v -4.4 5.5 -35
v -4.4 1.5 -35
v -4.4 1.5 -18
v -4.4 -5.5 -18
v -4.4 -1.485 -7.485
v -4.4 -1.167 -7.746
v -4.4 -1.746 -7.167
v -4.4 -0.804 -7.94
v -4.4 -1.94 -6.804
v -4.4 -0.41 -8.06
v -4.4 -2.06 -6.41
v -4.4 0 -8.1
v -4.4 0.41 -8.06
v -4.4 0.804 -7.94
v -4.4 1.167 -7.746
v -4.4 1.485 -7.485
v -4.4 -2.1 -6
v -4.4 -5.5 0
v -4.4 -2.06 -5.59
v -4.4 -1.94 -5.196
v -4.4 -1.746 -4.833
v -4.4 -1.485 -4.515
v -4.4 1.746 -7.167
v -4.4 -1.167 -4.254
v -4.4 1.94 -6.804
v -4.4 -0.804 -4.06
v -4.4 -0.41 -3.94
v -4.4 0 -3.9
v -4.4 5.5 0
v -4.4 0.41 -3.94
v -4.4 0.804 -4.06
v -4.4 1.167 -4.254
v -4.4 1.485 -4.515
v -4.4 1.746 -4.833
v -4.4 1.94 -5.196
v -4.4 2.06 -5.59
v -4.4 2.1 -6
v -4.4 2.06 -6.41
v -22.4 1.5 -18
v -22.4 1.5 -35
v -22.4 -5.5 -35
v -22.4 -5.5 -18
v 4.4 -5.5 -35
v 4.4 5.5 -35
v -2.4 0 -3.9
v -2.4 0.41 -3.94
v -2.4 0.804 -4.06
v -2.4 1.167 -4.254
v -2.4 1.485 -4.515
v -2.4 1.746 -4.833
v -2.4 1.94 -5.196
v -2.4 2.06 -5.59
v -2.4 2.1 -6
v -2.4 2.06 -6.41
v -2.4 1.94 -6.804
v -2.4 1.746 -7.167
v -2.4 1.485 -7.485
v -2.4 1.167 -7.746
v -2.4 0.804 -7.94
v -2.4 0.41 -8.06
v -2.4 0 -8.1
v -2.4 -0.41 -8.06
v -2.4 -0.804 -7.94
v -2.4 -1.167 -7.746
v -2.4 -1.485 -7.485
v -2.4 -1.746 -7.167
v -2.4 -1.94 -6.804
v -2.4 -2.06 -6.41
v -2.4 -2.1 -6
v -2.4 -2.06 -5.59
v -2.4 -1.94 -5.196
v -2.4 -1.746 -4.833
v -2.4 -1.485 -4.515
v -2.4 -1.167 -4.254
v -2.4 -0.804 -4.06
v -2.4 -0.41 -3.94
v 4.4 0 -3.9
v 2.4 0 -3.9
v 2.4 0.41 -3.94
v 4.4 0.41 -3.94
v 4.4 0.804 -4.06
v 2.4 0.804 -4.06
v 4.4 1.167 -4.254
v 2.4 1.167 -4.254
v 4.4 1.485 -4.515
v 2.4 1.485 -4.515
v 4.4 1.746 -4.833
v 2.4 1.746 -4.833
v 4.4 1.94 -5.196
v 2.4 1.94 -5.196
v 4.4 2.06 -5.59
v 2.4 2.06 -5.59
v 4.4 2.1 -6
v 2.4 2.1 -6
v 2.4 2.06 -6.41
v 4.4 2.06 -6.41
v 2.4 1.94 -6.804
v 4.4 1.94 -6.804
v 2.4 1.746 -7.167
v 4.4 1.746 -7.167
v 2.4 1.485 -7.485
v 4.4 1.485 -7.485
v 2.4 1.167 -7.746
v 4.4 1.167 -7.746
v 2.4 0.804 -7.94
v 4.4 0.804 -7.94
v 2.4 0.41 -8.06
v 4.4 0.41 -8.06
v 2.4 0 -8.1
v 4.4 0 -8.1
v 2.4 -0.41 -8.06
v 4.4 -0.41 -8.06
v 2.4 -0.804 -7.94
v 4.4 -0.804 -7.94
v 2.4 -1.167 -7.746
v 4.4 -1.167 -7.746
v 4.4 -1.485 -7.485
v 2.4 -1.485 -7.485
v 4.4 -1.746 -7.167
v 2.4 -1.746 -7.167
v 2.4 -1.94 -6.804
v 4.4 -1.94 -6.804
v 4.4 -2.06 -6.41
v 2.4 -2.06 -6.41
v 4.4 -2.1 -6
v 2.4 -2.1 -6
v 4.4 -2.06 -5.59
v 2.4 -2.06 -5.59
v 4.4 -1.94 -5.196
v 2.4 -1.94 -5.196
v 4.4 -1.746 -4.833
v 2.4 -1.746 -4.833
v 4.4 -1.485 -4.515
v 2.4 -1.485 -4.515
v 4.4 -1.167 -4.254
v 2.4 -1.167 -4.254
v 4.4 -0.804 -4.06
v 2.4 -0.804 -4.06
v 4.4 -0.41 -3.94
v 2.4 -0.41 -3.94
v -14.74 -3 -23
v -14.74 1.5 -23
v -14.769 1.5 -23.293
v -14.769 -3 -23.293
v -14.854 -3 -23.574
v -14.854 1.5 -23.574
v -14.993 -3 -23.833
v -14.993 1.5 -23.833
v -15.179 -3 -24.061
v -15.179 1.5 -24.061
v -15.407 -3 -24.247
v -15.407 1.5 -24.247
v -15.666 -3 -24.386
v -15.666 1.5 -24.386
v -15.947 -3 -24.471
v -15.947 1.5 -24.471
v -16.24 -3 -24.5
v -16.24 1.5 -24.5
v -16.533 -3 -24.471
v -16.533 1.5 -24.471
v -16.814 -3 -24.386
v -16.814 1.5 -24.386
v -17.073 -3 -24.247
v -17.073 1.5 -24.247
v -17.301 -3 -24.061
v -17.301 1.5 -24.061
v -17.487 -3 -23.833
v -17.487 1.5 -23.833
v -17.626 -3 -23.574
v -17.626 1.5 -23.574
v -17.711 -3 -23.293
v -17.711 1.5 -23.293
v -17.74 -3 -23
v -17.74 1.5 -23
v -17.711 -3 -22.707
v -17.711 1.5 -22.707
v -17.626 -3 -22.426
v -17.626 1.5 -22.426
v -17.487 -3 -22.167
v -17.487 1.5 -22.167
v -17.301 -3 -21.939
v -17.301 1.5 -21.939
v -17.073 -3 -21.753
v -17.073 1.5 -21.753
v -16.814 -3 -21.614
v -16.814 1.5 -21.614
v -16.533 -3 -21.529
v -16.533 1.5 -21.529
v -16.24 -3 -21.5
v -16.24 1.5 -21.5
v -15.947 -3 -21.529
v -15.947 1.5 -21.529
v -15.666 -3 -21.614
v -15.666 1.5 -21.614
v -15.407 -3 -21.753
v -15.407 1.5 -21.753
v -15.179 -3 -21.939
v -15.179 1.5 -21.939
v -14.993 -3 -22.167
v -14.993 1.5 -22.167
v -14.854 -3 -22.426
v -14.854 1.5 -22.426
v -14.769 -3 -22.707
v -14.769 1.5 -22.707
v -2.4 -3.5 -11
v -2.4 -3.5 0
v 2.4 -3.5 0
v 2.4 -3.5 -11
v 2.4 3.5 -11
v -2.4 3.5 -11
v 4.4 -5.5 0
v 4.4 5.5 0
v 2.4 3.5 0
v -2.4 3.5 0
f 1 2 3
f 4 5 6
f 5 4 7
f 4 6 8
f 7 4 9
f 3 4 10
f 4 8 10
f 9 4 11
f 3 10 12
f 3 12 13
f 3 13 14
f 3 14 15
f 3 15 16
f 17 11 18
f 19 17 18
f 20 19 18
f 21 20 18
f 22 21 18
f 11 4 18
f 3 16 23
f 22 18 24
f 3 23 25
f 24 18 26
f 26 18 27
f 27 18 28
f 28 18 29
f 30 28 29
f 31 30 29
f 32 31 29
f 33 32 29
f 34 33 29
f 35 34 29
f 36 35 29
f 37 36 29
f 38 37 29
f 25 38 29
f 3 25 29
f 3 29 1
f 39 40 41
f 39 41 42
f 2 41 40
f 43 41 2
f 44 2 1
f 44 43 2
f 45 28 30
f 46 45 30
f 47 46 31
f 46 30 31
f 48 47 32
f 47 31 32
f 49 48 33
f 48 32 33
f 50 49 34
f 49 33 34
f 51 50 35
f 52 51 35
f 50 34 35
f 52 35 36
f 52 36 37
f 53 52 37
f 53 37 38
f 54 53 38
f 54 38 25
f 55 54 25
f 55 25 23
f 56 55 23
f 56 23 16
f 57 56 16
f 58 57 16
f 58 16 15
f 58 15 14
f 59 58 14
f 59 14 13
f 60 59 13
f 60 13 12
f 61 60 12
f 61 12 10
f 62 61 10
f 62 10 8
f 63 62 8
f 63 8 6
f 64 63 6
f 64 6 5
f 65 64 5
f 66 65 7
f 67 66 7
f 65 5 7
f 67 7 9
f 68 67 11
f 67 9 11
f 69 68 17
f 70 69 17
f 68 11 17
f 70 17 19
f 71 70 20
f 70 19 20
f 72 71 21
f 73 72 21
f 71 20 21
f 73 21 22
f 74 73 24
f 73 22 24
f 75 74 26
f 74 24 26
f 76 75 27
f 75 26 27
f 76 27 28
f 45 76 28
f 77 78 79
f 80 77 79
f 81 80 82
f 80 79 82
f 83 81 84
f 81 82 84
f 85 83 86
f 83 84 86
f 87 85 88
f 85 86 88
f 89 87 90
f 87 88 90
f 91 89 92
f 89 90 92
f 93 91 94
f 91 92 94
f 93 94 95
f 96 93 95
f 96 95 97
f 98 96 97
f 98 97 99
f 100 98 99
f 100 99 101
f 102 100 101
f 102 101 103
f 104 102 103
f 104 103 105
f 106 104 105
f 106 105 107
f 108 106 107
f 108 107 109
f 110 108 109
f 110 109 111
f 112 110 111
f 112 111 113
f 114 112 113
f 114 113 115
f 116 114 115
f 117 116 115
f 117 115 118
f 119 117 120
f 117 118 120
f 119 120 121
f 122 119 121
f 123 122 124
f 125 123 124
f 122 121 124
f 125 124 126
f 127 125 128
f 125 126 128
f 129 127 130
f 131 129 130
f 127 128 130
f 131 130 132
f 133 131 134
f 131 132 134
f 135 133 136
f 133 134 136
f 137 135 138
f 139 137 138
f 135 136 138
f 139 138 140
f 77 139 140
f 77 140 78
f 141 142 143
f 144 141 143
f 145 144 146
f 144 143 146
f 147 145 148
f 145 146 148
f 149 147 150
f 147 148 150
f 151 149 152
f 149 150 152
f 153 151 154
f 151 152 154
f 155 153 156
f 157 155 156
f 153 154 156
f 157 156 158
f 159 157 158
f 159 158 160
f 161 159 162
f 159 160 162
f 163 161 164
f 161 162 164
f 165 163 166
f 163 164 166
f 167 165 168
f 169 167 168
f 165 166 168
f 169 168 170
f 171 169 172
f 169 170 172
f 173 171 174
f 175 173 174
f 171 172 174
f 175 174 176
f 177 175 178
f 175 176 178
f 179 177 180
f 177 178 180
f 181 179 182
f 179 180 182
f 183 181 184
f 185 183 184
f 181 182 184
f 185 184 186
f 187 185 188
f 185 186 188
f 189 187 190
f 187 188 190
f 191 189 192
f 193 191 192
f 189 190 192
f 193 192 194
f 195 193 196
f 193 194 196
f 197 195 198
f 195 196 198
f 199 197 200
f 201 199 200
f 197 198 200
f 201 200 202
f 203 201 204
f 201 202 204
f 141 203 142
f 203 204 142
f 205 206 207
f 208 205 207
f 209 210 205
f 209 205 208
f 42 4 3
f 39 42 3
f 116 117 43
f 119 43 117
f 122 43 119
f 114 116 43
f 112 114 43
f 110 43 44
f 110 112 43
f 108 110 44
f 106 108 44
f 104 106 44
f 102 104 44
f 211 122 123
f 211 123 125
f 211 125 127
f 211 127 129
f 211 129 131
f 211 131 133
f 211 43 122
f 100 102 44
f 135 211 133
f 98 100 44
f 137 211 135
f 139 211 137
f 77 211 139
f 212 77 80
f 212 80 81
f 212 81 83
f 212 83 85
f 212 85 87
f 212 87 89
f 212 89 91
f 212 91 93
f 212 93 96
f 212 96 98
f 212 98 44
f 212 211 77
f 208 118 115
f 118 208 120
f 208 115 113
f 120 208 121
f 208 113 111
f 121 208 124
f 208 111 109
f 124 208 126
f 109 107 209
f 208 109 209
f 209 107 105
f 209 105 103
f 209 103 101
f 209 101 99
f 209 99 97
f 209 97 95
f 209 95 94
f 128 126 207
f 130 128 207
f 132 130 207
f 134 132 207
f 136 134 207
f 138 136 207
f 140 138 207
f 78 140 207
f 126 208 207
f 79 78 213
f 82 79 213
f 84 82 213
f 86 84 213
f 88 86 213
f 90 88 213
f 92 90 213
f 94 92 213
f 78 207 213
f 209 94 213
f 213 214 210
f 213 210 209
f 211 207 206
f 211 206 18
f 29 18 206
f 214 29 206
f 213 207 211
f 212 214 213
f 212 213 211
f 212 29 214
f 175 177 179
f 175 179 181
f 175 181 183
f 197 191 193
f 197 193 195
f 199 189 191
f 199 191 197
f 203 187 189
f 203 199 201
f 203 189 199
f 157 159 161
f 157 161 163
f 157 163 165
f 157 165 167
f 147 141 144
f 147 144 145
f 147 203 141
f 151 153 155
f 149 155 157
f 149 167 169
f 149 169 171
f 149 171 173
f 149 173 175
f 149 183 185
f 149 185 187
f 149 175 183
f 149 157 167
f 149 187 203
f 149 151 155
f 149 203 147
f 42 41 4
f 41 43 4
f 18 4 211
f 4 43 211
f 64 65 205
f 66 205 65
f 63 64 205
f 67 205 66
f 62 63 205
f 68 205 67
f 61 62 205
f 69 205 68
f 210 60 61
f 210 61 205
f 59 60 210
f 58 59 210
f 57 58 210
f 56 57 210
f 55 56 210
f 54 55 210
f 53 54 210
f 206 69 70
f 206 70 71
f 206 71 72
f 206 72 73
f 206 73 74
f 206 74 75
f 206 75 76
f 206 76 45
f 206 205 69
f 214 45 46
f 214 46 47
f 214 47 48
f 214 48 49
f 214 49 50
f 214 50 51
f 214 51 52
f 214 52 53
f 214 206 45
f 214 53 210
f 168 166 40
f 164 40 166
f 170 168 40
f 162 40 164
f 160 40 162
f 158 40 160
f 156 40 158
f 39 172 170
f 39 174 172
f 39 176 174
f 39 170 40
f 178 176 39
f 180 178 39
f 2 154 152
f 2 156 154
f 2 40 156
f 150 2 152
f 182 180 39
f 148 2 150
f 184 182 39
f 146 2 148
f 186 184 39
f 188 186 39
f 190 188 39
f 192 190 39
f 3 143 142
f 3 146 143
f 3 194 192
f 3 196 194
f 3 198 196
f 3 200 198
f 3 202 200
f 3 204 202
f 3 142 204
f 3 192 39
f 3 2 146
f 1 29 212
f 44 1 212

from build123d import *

# Parameters (mm, degrees)
SKETCH_1_W          = 8.8
SKETCH_1_H          = 11
EXTRUDE_1_DEPTH     = 35
SKETCH_2_W          = 4.8
SKETCH_2_H          = 7
CUT_EXTRUDE_1_DEPTH = 11
SKETCH_3_R          = 2.1
CUT_EXTRUDE_2_DEPTH = 11
SKETCH_4_W          = 17
SKETCH_4_H          = 7
EXTRUDE_2_DEPTH     = 18
SKETCH_5_R          = 1.5
CUT_EXTRUDE_3_DEPTH = 4.5


with BuildPart() as part:
    # 草图1 → 凸台-拉伸1 (new body)
    with BuildSketch(Plane.XY):
        Rectangle(SKETCH_1_W, SKETCH_1_H)
    extrude(amount=-EXTRUDE_1_DEPTH)

    # 草图2 → 切除-拉伸1 (cut)
    with BuildSketch(Plane.XY):
        Rectangle(SKETCH_2_W, SKETCH_2_H)
    extrude(amount=-CUT_EXTRUDE_1_DEPTH, mode=Mode.SUBTRACT)

    # 草图3 → 切除-拉伸2 (cut)
    with BuildSketch(Plane.ZY.offset(4.4)):
        with Locations((-6, 0)):
            Circle(SKETCH_3_R)
    extrude(amount=-CUT_EXTRUDE_2_DEPTH, mode=Mode.SUBTRACT)

    # 草图4 → 凸台-拉伸2 (add)
    with BuildSketch(Plane.ZY.offset(4.4)):
        with Locations((-26.5, -2)):
            Rectangle(SKETCH_4_W, SKETCH_4_H)
    extrude(amount=EXTRUDE_2_DEPTH)

    # 草图5 → 切除-拉伸3 (cut)
    with BuildSketch(Plane(origin=(0, 1.5, 0), x_dir=(1, 0, 0), z_dir=(0, 1, 0))):
        with Locations((-16.24, 23)):
            Circle(SKETCH_5_R)
    extrude(amount=-CUT_EXTRUDE_3_DEPTH, mode=Mode.SUBTRACT)


solid = part.part
